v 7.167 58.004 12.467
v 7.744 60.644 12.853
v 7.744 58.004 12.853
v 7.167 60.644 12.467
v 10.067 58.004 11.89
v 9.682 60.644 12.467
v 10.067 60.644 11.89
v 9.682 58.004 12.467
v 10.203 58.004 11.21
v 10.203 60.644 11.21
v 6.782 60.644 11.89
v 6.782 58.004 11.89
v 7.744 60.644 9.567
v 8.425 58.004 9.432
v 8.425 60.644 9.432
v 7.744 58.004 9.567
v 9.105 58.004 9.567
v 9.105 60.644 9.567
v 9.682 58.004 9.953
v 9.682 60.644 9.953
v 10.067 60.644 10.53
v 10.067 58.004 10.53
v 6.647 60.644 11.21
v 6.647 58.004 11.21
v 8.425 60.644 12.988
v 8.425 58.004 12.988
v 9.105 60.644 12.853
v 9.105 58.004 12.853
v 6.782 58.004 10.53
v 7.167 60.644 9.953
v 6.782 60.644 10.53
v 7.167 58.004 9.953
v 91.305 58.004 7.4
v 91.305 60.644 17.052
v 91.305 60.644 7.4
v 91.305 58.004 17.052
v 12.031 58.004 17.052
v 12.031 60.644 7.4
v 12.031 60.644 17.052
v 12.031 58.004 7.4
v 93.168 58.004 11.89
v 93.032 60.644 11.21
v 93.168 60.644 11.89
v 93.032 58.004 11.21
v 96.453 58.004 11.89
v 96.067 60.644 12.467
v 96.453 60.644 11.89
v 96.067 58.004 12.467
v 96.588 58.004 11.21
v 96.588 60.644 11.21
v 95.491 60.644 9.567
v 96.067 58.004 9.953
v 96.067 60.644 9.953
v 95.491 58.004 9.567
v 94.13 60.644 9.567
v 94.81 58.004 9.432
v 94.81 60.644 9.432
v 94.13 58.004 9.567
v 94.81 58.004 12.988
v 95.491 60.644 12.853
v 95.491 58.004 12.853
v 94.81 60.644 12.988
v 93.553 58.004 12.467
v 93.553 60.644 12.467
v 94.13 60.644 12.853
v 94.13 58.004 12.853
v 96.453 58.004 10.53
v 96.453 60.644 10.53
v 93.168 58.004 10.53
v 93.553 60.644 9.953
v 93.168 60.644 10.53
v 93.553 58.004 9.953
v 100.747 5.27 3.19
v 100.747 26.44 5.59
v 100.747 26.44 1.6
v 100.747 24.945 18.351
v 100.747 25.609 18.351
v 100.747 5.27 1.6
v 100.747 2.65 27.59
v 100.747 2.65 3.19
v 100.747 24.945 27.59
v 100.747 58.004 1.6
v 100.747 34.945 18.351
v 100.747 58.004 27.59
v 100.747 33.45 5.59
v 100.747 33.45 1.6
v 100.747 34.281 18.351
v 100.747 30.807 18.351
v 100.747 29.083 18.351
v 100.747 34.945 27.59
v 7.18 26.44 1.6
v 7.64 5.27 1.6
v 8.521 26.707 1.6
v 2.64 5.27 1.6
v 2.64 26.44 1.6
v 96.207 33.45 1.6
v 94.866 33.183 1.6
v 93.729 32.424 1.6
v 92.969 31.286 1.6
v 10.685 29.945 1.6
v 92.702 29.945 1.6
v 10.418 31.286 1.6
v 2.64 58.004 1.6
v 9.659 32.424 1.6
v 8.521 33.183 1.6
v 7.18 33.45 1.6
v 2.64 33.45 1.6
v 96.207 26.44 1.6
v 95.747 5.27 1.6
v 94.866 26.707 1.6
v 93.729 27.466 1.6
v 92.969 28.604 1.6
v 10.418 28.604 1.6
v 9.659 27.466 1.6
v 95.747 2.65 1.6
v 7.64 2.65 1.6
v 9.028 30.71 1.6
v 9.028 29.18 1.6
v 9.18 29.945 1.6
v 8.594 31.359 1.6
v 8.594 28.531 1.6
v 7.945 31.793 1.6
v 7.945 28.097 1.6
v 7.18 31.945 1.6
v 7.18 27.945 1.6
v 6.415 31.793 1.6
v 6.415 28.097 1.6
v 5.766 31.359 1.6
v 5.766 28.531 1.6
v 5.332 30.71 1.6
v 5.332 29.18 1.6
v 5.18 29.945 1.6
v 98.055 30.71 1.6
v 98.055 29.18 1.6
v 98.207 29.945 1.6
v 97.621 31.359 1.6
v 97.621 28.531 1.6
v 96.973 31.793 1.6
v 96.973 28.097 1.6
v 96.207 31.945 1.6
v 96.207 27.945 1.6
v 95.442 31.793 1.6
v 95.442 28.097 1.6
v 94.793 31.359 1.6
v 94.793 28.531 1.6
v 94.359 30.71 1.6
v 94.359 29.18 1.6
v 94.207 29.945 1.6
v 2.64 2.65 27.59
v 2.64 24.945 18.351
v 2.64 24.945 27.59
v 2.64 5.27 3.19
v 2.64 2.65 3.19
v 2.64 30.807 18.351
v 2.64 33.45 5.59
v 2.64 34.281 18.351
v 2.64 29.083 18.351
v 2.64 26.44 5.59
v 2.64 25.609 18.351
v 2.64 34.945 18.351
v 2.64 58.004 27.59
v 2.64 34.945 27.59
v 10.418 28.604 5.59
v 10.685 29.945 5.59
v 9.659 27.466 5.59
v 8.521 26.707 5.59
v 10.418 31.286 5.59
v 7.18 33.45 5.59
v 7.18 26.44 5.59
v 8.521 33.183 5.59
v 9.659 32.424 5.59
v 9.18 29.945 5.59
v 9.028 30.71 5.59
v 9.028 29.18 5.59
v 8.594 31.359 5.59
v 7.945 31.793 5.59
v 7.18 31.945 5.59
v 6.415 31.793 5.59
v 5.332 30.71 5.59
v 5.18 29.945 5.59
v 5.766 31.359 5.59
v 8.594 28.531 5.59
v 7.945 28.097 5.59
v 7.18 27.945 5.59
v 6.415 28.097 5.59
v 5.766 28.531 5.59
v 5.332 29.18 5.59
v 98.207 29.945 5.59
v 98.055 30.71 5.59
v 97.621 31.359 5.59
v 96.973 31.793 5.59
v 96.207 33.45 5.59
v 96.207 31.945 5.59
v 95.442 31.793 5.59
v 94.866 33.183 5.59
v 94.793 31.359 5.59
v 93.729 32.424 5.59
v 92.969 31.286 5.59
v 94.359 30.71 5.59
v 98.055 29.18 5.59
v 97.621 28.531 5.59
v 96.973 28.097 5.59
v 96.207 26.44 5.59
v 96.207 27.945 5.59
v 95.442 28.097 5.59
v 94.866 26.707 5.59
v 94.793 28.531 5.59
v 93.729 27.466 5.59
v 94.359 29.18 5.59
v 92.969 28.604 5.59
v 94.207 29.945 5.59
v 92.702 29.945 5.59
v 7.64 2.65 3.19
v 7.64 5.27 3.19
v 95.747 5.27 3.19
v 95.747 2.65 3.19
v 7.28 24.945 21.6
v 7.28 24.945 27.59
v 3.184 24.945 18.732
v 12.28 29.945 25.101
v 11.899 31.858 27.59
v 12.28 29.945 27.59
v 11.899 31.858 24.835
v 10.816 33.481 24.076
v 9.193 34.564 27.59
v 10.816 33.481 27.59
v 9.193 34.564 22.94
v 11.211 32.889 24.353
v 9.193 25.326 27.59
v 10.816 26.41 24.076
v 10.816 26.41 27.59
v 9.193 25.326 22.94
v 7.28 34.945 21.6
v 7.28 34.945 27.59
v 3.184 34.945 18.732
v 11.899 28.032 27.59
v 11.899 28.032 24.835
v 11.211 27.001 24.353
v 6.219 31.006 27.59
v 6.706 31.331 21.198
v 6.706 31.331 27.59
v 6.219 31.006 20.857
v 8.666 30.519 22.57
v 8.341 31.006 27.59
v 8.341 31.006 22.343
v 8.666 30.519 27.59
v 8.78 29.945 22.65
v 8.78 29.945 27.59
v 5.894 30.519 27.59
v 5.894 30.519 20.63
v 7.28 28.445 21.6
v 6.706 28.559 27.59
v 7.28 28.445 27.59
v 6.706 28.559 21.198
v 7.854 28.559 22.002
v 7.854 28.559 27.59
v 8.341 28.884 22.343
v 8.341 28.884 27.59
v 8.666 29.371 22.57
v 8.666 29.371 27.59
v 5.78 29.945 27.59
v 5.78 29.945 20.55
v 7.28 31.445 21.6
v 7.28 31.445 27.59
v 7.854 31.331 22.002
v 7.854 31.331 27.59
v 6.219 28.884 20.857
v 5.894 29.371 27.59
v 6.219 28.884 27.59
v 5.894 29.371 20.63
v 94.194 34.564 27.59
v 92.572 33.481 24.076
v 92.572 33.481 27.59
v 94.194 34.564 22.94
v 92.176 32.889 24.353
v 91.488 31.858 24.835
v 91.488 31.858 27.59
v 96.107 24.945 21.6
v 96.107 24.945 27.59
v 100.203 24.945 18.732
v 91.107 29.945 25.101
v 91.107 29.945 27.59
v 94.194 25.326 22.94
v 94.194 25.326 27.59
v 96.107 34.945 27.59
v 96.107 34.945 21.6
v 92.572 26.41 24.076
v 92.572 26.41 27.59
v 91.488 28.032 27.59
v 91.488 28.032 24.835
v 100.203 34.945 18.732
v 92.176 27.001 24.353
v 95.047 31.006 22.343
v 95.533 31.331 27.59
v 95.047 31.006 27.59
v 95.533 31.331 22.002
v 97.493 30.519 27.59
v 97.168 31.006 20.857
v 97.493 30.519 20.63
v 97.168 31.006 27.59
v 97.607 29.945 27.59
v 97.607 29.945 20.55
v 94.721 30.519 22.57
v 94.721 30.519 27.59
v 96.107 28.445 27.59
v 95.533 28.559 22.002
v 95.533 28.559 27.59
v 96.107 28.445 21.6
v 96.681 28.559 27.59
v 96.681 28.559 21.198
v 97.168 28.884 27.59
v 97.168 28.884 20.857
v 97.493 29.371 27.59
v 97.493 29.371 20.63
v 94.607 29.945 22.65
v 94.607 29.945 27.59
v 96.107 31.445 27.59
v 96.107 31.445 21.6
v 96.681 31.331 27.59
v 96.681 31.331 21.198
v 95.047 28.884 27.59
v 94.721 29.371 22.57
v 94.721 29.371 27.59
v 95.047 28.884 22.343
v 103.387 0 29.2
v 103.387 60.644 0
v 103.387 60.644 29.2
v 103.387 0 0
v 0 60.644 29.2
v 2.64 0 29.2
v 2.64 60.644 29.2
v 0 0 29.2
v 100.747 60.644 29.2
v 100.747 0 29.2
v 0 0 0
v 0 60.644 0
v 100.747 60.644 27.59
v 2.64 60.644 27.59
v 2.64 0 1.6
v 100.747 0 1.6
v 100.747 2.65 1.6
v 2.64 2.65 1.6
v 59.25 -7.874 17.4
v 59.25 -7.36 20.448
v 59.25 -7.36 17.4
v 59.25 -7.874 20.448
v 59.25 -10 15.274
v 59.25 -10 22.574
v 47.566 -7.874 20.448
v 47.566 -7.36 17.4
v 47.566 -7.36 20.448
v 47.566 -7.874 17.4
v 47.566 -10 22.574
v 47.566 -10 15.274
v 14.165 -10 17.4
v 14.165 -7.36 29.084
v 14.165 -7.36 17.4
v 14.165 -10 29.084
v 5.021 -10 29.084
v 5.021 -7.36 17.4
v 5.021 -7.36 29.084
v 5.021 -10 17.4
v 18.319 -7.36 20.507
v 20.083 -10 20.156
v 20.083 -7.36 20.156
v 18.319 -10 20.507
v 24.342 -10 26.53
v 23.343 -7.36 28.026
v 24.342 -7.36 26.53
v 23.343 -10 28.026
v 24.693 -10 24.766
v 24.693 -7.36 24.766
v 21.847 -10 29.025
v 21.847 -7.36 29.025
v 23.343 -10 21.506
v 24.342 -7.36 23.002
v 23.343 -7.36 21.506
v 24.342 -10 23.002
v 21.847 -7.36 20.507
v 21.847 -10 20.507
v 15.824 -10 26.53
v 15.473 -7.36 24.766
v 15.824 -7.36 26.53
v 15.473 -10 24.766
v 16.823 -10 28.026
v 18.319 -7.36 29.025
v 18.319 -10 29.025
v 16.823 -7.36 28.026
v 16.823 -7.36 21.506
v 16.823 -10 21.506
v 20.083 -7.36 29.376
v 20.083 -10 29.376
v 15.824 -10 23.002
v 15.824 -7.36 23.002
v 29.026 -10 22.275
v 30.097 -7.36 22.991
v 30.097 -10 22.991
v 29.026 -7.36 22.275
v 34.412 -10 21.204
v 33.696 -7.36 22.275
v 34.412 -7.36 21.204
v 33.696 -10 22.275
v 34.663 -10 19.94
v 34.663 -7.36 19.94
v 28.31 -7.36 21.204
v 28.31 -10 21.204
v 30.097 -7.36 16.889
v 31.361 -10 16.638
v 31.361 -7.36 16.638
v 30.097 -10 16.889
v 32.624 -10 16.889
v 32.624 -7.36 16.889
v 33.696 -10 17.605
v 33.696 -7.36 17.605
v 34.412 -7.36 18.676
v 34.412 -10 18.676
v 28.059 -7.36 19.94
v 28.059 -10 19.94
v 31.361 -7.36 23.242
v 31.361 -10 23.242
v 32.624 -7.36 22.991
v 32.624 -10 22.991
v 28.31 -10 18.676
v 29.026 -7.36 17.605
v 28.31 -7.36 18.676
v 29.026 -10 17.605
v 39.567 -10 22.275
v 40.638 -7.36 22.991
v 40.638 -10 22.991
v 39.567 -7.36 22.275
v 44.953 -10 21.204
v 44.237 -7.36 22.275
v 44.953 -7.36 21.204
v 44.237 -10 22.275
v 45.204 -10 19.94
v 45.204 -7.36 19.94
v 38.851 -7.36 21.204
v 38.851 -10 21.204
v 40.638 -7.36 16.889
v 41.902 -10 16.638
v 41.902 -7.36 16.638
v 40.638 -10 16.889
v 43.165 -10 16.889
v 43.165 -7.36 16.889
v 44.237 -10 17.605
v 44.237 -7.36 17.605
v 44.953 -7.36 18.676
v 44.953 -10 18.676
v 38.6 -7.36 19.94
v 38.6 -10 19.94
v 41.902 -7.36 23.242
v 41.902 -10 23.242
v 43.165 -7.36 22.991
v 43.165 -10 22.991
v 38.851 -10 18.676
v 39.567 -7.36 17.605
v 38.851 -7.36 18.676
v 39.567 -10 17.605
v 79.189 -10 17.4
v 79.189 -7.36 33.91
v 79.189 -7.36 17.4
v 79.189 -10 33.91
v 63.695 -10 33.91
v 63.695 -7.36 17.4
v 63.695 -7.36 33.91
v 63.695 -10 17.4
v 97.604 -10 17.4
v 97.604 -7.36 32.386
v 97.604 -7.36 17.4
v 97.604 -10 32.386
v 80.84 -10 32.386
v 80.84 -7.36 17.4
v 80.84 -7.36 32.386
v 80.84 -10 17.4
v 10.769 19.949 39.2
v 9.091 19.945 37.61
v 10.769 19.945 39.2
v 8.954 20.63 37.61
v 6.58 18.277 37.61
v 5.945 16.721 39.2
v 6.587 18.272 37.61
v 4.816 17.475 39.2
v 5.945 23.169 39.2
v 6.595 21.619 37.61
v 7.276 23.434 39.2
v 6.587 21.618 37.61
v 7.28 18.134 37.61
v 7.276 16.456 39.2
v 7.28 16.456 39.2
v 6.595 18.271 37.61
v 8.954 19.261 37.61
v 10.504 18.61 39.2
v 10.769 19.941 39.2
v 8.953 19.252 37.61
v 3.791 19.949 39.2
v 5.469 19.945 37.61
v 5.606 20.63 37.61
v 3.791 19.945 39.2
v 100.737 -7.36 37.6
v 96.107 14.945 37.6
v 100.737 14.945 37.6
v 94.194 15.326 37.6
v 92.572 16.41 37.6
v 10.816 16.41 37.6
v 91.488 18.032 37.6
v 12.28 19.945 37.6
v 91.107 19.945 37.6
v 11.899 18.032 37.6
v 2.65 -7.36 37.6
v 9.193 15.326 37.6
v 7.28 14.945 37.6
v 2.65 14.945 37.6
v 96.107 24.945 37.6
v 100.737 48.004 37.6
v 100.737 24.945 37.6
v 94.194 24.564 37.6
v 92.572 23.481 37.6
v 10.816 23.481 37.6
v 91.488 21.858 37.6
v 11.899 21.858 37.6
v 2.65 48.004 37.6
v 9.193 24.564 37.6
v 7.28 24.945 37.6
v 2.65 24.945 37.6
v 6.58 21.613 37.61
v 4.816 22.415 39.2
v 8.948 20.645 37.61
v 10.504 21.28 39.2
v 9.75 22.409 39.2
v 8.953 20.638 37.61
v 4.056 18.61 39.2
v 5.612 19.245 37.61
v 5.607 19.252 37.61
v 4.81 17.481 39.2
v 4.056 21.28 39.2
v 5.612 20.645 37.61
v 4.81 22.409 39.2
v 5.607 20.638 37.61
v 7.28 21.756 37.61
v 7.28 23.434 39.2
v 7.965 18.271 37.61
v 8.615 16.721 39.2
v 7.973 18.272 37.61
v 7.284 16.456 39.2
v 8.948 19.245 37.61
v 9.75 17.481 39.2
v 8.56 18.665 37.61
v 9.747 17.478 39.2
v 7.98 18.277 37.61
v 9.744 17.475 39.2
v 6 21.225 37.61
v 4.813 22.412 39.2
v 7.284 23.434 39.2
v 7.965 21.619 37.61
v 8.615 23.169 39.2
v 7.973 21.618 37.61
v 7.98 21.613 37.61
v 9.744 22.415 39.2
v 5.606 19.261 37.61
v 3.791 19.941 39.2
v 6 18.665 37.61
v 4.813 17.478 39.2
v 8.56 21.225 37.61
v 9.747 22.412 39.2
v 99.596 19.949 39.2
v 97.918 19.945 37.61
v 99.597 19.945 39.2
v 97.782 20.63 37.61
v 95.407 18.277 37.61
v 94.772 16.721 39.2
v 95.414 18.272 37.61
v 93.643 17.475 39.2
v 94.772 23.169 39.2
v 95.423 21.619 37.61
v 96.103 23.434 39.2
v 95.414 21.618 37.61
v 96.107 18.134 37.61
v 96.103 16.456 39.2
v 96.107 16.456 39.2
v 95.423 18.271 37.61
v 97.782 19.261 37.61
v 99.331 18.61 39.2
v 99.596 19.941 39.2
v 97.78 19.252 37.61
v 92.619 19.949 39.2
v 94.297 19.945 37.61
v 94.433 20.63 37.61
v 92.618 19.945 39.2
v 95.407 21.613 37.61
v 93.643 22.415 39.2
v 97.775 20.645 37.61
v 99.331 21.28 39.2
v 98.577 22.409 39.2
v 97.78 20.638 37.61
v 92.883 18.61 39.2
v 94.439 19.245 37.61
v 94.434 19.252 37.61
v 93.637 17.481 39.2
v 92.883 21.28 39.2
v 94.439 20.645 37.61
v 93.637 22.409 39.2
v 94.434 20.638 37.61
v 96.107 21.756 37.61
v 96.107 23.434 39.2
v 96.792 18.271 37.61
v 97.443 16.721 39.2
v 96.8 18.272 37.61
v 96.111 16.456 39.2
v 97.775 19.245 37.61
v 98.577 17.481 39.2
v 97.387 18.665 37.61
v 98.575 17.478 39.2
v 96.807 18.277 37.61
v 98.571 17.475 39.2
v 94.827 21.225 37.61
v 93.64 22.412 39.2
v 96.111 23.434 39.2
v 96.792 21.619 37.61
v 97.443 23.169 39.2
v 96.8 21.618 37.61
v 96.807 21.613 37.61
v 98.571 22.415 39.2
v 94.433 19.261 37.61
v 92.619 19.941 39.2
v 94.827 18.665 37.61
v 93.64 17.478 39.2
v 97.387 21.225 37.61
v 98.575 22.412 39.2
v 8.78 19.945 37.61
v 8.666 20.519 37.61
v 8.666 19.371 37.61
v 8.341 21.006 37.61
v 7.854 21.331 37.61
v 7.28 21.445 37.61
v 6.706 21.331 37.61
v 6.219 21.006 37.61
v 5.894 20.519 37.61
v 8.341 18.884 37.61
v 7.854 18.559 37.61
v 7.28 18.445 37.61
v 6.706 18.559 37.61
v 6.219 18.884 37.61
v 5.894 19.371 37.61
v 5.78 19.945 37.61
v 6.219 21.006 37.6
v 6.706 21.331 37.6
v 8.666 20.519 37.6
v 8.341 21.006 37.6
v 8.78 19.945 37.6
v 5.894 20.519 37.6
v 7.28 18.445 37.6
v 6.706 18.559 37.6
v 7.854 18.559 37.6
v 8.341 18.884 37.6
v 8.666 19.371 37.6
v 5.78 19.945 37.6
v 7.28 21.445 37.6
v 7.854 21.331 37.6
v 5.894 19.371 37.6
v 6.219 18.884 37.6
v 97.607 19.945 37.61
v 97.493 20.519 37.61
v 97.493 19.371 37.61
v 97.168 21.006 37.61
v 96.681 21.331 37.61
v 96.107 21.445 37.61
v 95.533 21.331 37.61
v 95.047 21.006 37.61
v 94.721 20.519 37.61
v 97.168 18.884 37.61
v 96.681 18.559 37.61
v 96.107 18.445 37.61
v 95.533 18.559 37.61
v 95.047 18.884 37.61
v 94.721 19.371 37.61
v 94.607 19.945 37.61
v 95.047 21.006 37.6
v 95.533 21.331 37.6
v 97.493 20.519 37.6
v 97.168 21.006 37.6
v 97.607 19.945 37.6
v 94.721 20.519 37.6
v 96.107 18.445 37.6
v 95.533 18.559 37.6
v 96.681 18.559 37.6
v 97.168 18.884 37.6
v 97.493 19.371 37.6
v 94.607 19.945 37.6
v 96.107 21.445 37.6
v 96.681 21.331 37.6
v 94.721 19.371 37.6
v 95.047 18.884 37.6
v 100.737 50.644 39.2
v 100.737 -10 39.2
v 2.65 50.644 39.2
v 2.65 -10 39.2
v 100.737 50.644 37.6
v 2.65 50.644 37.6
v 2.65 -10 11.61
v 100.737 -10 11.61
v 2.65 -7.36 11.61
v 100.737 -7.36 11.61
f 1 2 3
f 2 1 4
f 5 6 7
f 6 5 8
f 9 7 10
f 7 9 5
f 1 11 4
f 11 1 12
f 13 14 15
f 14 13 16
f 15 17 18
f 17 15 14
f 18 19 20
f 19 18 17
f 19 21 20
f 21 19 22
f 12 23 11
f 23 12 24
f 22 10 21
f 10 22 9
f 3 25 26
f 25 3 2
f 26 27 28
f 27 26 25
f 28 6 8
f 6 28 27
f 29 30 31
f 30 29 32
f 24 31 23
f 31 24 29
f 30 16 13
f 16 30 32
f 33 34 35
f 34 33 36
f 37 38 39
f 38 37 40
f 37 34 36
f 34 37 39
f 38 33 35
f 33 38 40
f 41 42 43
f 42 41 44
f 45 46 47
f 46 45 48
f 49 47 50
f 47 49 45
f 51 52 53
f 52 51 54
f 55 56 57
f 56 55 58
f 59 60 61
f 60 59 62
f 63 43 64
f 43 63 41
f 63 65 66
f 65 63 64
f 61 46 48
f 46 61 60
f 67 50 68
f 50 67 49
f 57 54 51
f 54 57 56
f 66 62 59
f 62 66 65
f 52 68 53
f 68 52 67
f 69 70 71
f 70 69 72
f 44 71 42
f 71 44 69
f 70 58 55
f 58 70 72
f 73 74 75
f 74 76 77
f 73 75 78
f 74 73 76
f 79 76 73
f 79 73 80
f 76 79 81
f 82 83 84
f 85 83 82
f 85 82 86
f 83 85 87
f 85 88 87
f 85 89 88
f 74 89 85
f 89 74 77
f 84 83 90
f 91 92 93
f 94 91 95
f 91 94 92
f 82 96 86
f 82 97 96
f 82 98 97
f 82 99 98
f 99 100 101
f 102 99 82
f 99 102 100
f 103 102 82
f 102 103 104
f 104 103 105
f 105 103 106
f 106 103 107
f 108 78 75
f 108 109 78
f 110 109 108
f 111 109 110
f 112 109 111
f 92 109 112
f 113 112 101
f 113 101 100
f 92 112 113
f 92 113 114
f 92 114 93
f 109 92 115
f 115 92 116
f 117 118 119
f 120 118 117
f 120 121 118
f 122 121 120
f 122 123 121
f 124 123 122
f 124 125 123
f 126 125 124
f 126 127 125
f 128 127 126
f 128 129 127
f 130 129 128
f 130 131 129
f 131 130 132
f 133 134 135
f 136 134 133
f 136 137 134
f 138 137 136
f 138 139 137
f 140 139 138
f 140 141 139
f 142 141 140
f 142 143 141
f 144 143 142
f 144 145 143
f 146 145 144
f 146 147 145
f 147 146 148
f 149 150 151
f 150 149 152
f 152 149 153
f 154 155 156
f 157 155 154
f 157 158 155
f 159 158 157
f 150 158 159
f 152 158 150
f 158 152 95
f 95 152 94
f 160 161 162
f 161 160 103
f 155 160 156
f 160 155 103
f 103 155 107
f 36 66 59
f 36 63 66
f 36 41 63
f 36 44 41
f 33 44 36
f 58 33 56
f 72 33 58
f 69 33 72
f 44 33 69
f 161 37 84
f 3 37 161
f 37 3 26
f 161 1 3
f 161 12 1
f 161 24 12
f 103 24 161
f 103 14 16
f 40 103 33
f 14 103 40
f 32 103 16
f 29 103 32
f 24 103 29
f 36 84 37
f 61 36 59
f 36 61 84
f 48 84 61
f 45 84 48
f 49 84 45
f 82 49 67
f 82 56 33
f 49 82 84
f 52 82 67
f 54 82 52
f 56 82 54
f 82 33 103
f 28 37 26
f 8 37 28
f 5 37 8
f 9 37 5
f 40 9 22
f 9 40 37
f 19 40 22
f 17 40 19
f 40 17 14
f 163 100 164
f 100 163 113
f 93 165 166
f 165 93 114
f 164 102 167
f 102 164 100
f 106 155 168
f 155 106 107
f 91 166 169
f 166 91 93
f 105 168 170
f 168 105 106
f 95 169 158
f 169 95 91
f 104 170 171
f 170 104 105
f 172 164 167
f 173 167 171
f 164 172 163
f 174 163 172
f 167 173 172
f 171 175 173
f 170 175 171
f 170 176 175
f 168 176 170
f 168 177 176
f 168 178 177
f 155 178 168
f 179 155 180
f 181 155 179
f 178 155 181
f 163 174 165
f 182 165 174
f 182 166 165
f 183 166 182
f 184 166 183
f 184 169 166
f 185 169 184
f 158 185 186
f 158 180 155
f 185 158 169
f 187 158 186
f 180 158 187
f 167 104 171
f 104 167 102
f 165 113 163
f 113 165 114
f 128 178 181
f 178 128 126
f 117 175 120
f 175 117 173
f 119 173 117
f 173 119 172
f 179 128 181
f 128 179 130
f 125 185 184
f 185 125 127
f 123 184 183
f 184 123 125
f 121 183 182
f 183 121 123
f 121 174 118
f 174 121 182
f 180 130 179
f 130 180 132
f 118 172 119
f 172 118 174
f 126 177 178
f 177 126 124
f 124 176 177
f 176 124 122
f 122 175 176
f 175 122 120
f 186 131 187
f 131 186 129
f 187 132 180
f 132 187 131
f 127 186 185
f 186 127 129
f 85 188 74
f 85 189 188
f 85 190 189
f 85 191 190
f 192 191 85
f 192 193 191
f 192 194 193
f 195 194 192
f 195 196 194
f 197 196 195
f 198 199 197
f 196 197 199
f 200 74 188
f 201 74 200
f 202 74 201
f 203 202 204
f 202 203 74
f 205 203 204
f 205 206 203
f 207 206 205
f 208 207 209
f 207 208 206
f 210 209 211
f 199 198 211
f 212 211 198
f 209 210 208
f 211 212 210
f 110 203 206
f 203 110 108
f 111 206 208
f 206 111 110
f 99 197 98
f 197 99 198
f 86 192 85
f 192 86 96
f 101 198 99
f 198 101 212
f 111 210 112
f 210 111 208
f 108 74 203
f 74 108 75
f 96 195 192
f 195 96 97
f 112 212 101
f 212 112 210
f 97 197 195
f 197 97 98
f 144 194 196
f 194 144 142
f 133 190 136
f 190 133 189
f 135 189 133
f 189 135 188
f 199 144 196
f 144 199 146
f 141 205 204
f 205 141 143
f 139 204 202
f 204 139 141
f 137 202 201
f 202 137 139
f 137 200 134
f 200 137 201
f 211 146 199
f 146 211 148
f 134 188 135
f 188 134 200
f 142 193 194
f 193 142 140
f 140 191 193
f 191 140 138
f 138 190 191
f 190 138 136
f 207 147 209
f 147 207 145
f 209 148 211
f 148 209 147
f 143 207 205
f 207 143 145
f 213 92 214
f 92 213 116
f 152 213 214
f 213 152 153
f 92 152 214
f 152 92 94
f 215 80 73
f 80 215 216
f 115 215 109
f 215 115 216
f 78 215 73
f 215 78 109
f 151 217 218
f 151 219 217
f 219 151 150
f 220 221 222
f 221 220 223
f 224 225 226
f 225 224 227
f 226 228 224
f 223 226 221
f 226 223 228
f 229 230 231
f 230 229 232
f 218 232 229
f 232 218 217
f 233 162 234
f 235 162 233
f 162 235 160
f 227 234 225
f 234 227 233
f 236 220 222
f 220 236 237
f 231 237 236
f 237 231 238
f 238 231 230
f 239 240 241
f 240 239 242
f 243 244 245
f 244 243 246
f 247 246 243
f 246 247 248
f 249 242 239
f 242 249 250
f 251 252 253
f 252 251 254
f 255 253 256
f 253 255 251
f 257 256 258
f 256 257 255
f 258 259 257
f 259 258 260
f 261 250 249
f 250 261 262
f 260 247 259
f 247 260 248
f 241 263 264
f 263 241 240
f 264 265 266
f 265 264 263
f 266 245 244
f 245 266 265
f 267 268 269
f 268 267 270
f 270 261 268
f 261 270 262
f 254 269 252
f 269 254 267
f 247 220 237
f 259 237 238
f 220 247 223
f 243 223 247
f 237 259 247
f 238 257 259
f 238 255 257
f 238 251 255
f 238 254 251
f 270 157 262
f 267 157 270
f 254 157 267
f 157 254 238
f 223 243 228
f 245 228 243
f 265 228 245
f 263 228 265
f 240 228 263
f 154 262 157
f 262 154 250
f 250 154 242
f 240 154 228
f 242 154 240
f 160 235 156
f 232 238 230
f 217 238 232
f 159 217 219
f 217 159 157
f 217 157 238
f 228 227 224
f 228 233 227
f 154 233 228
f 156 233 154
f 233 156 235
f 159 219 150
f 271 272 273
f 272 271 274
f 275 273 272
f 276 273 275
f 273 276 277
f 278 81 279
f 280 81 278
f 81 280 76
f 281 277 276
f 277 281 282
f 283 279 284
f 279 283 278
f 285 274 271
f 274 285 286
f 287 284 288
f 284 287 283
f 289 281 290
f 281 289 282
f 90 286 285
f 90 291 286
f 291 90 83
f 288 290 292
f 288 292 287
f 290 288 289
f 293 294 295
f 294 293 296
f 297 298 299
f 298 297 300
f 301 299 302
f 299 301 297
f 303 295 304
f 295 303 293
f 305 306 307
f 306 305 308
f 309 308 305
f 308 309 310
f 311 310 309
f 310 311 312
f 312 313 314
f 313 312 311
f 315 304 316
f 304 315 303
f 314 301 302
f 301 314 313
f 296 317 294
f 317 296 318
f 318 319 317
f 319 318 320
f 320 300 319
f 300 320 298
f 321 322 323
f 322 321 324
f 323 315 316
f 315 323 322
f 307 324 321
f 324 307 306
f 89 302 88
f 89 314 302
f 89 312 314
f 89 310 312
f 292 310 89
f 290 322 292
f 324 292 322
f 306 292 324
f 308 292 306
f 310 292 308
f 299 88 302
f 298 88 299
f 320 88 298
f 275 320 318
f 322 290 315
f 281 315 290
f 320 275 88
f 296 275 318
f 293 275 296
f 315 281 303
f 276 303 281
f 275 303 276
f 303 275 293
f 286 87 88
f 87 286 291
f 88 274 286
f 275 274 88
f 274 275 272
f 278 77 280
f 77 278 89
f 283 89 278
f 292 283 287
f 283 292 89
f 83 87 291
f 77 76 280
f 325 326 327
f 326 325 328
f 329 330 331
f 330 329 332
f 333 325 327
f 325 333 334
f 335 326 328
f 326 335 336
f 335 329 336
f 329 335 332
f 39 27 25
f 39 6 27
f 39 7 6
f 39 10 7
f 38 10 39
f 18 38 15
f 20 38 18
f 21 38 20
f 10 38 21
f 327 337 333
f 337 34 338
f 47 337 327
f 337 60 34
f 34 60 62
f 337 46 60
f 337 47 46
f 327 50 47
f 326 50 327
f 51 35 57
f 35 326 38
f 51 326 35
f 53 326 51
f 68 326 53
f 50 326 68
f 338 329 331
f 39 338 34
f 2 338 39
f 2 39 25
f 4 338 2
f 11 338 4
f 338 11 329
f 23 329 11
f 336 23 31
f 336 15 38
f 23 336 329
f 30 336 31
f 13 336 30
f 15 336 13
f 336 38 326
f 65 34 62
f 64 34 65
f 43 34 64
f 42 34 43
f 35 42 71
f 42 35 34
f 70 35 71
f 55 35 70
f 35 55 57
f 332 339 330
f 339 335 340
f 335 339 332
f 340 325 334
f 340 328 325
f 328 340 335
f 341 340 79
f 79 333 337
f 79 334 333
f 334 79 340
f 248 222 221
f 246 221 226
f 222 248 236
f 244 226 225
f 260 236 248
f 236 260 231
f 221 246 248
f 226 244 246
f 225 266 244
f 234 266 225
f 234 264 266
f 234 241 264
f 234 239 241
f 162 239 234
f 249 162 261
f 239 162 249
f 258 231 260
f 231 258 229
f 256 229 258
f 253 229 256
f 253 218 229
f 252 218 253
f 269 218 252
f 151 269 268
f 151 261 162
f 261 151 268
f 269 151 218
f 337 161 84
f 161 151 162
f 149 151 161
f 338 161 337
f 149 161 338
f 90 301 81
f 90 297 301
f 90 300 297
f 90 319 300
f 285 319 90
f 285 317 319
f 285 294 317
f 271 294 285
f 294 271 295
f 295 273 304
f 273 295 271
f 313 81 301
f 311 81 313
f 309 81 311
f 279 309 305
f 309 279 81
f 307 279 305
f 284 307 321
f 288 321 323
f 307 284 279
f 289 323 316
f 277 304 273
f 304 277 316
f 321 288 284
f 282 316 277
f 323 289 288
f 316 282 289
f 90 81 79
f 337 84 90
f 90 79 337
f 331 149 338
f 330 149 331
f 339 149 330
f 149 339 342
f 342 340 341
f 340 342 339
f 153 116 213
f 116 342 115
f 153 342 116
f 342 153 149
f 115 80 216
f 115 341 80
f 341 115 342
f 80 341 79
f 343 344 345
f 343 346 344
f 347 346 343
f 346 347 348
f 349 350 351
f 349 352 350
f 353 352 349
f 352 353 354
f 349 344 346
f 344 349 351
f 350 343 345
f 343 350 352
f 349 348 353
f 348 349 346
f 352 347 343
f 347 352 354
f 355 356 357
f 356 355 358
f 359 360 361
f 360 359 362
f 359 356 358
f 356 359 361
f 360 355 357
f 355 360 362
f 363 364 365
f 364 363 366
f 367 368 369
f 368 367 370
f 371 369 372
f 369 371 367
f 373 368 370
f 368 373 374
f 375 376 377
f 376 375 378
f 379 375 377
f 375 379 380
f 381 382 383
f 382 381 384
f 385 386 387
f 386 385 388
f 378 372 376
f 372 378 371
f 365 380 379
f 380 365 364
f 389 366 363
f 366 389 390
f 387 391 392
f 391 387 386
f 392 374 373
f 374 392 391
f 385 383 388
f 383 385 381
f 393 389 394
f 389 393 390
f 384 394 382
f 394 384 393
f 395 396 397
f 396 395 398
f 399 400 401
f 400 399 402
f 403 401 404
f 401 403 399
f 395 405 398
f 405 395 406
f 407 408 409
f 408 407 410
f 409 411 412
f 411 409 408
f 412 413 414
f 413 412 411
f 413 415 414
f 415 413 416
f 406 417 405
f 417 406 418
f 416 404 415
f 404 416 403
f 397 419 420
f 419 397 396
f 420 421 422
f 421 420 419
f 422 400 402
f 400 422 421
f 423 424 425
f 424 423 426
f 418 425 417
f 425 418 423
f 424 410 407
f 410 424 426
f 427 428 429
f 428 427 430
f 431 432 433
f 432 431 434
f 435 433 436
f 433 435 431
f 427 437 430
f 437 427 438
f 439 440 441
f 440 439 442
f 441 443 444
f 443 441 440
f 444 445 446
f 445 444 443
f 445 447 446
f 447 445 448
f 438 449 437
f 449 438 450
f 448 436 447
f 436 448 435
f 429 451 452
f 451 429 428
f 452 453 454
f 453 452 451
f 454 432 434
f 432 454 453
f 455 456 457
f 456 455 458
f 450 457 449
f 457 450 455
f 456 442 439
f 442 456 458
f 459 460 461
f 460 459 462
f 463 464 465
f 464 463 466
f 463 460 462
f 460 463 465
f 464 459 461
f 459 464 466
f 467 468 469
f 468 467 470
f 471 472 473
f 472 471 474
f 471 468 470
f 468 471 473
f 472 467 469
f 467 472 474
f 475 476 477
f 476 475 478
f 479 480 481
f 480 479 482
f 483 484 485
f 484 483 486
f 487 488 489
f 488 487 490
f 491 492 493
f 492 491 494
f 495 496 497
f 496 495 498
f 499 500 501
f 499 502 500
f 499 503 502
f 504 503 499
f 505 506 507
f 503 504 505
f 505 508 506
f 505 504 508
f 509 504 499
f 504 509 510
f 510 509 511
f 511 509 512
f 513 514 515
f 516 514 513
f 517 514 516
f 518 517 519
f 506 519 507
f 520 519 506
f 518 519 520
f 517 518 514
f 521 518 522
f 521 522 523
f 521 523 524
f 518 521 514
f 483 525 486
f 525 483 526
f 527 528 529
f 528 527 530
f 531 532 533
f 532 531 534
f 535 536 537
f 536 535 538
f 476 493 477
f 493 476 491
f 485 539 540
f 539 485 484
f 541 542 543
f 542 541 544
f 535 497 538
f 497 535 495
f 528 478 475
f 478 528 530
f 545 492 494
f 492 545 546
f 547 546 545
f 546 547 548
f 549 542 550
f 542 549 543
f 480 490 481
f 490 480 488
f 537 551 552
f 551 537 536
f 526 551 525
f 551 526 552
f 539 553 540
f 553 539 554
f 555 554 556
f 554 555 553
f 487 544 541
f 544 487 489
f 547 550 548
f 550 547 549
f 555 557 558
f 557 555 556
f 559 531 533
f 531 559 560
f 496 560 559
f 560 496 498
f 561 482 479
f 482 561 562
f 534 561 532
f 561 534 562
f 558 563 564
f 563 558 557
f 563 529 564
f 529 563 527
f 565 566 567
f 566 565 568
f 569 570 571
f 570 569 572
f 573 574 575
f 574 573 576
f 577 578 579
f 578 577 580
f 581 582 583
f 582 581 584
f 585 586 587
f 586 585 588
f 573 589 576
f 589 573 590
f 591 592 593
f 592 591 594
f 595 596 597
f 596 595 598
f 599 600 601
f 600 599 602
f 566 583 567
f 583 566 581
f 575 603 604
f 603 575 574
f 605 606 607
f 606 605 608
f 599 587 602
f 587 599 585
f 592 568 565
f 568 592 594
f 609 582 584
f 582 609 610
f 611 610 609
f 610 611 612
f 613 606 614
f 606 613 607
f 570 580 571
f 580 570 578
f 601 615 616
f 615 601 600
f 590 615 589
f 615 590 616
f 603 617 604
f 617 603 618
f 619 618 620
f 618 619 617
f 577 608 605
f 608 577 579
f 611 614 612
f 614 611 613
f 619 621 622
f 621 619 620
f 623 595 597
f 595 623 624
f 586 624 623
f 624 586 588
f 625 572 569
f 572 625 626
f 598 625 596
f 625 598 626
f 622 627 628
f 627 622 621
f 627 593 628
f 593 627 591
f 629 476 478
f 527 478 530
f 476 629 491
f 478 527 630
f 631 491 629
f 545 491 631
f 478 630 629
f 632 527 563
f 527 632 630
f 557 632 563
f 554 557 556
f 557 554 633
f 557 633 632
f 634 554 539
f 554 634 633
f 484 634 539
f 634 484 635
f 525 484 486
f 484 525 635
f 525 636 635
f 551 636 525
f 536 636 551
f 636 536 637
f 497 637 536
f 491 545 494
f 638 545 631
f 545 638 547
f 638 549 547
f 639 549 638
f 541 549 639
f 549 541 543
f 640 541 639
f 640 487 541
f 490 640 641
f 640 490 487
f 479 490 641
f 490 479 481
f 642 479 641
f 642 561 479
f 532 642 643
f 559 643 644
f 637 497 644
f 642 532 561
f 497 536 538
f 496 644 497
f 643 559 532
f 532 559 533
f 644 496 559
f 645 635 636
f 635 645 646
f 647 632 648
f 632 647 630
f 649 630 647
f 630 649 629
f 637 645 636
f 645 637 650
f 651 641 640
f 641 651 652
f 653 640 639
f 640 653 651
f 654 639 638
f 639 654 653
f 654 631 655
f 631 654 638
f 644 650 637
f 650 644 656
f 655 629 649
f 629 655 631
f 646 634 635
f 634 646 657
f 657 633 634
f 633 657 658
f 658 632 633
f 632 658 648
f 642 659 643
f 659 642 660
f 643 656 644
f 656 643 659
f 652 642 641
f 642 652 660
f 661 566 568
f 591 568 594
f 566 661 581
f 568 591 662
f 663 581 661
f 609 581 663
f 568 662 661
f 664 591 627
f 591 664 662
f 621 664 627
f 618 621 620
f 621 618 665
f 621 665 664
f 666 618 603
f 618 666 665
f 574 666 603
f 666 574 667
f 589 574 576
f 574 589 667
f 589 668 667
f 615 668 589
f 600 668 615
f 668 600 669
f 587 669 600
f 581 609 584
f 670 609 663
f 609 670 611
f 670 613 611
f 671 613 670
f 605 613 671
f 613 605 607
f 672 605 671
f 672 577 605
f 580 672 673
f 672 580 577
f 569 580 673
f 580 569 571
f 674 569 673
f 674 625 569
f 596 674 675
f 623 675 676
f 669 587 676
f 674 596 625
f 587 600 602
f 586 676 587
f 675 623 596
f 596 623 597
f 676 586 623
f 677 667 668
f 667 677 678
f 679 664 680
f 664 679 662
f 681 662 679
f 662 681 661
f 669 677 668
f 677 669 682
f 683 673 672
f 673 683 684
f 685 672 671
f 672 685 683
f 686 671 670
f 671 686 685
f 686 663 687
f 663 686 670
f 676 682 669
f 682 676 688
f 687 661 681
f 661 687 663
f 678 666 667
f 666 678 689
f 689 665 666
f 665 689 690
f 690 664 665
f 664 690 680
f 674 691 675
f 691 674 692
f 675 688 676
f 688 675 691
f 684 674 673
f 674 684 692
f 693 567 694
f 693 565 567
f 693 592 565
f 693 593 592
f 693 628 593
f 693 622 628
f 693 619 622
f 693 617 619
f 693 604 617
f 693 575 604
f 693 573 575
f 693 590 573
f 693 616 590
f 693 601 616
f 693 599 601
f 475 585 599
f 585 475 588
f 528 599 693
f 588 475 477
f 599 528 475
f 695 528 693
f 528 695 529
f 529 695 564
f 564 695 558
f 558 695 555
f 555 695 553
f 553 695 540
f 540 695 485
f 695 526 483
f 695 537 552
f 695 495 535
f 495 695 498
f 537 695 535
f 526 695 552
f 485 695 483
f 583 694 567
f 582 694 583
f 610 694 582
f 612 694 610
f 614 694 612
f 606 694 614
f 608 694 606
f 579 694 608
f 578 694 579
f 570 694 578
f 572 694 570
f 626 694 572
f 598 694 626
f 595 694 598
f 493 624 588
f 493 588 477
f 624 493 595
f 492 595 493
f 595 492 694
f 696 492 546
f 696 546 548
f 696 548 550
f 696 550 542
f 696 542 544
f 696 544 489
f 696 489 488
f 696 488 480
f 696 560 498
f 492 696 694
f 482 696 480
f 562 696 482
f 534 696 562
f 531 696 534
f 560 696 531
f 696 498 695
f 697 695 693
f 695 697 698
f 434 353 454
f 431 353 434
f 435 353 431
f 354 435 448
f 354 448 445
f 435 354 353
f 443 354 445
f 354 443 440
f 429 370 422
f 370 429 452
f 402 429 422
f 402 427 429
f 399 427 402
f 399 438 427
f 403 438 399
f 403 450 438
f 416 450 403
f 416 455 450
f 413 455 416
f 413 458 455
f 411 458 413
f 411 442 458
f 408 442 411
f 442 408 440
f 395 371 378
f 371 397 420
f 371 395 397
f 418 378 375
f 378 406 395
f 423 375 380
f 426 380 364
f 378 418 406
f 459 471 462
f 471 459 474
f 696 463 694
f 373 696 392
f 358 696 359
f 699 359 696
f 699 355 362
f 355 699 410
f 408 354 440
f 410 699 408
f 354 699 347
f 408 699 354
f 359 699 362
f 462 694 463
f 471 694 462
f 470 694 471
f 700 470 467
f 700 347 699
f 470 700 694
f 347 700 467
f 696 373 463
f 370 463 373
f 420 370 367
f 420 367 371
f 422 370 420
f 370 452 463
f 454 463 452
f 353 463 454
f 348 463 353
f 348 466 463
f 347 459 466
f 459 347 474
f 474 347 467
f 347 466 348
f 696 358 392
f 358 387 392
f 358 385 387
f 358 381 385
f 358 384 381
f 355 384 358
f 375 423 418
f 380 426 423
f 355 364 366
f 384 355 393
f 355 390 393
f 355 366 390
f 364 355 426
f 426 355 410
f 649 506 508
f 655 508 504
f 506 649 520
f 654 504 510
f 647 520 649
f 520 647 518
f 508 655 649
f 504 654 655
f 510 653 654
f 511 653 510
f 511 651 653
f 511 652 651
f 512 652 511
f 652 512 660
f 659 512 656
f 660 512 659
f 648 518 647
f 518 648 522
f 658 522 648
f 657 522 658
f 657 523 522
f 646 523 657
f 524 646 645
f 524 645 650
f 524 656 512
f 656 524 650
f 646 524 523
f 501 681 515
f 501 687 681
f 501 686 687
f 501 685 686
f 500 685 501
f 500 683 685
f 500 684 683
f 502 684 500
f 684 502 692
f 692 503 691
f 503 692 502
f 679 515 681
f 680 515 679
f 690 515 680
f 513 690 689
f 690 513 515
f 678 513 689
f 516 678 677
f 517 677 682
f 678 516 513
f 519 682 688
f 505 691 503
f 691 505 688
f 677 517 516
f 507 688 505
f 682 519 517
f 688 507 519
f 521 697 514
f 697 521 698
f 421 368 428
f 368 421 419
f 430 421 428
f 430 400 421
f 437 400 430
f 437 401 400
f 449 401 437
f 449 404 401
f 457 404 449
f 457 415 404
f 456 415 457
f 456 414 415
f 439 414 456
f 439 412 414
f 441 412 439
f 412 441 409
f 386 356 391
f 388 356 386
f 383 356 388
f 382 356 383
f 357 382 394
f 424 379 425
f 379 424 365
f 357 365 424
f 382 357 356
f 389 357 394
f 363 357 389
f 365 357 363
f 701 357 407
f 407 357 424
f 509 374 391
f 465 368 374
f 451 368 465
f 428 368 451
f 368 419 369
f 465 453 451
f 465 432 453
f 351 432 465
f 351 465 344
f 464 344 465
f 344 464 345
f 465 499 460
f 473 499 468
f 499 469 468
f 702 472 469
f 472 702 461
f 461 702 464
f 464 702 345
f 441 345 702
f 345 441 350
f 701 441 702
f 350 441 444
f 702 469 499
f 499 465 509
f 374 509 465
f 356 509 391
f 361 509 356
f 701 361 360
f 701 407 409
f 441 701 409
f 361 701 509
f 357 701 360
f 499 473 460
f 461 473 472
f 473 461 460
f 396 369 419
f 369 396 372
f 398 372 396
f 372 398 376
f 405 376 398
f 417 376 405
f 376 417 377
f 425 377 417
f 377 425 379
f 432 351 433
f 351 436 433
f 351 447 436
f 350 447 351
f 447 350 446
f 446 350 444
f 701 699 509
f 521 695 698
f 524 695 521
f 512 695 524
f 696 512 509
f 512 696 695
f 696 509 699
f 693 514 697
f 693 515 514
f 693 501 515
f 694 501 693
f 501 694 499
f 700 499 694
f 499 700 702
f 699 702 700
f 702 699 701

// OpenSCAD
/*
 * Most of the measurements are in mil, straight off the eagle board file
 *
 * (C) Michel Pollet <buserror@gmail.com>
 *
 ************************LICENSING TERMS***************************
 * This part is not for commercial distribution without a commercial 
 * license acquired from the author. Distribution on a small scale 
 * basis (< 25 units) in the Reprap spirit is free of charge on the
 * basis of mentioning the Author with the bill of material, any 
 * wider distribution requires my explicit, written permission.
 ******************************************************************
 *
 */
$fn = 16;

E=0.01;
mm = 1 / 39.37;

pushbutton_margin = 0.5;	

pcb_size = [ 3705 * mm, 2160 * mm, 20 ];
pcb_thickness = 1.8;

mounting_pos = [100 * mm, 1075 * mm, 0];
mounting_hole_r = 40 * mm;
mounting_tab_r = 138 * mm;
mounting_hole_r = 2;

thickness_side = 6 * 0.44;
thickness_plane = 8 * 0.20;

margin_b = 4;	// for screw inserts
margin_t = 2;
margin_side = 2;

screwtop_pos = [thickness_side, mounting_pos[1], 0];
screwtop_outside_r = 5;
screwtop_outside_h = 10;
screwtop_drill_r = 1.5;
screwtop_screw_head_r = 3.5;

box_inside = [
	pcb_size[0] + (2 * margin_side), 
	pcb_size[1] + pushbutton_margin, 
	pcb_size[2] + margin_b + margin_t ];
box_outside = [
	box_inside[0] + (thickness_side * 2),
	box_inside[1] + (thickness_side * 2),
	box_inside[2] + (thickness_plane * 2)];

demo = 1;

if (demo == 1) {
	bottom();
	translate([0, -10, 10])
		top();
} else {
	translate([0, -box_outside[1]-1, 0])
		bottom();
	translate([box_outside[0],3,box_outside[2]])
		rotate([180,0,180])
			top();
}

//translate([0, -80, 0])
//%	inside();

module top() {
	difference() {
		whole();
		translate([-1, thickness_side, -thickness_plane])
			cube([box_outside[0] + 2, box_outside[1] + 1, box_outside[2]]);
		translate([-1, -1, -1])
			cube([1 + thickness_side + E, box_outside[1] + 2, box_outside[2] + 2]);
		translate([box_outside[0]-thickness_side-E, -1, -1])
			cube([1 + thickness_side + E, box_outside[1] + 2, box_outside[2] + 2]);
		translate([-1, -1, -1])
			cube([box_outside[0] + 2, thickness_side + 2, 1 + thickness_plane + E ]);
	}
}

module bottom() {
	difference() {
		whole();
		translate([thickness_side, -1, box_outside[2] - thickness_plane - E])
			cube([box_inside[0], box_outside[1] + 2, thickness_plane + 1]);
		translate([thickness_side, -1, thickness_plane])
			cube([box_inside[0], thickness_side + 1 + E,  box_outside[2]]);
	}
}


module whole() {
	union() {
		difference() {
			cube(box_outside);
			
			translate([thickness_side, thickness_side, thickness_plane])
				inside();
		}
	}
}

module inside() {
	difference() {
		union() {
			cube(box_inside);
			translate([margin_side, 0, margin_b + pcb_thickness])
			rotate([90, 0, 0])
				frontcuts();
			translate([margin_side, box_inside[1], margin_b + pcb_thickness])
			rotate([90, 0, 0])
				backcuts();

			// screw tapers at the top
			for (offset = [0:1]) assign(x_offset = margin_side + screwtop_pos[0])
			translate([(offset * (box_inside[0] - (2*x_offset))) + x_offset, 
					screwtop_pos[1], box_inside[2] - screwtop_outside_h]) {
				cylinder(r = screwtop_drill_r, 
					h = screwtop_outside_h + thickness_plane + E);

				translate([0, 0, screwtop_outside_h])
					cylinder(r1 = screwtop_drill_r * 1.2, 
							r2 = screwtop_screw_head_r,
							h = thickness_plane + E);
			}
		}
		// mounting holes
		translate([0,0,-E]) {
			for (offset = [0:1]) assign(x_offset = margin_side + mounting_pos[0])
			translate([(offset * (box_inside[0] - (2*x_offset))) + x_offset, 
					mounting_pos[1], mounting_pos[2]]) {
				difference() {
					hull() {
						cylinder(r = mounting_tab_r, h = margin_b);
						translate([(offset ? 1 : -1) * mounting_tab_r * 2, 0, 0])
						cylinder(r = mounting_tab_r, h = margin_b);
					}
					cylinder(r = mounting_hole_r, h = margin_b + E);
				}
			}
		}
		// small tabs at the bottom to keep it neat
		translate([0,-E,-E]) {
			cube([5, thickness_side, thickness_plane]);
			translate([box_inside[0]-5,0,0])
				cube([5, thickness_side, thickness_plane]);
		}
		for (offset = [0:1]) assign(x_offset = margin_side + screwtop_pos[0])
		translate([(offset * (box_inside[0] - (2*x_offset))) + x_offset, 
				screwtop_pos[1], box_inside[2] - screwtop_outside_h]) {
			difference() {
				hull() {
					cylinder(r = screwtop_outside_r, h = screwtop_outside_h + E);
					translate([(offset ? 1 : -1) * screwtop_outside_r * 2, 0, 0])
					cylinder(r = screwtop_outside_r, h = screwtop_outside_h + E);
				}
				cylinder(r = screwtop_drill_r, 
					h = screwtop_outside_h + thickness_plane + E);

				translate([0, 0, 4])
					rotate([0,(offset ? -1 : 1) * 145,0])
						cylinder(r = 10, h = 10);
			}
		}

	}
}

module frontcuts() {
	assign(h = thickness_side + 2*E)
	translate([0,0, -E]) {
		translate([(195 - (360/2)) * mm, 0, 0])
			cube([360 * mm, 460 * mm, h]);
		translate([608 * mm, 290 * mm, 0])	// composite
			cylinder(r = 1.1 * 165 * mm, h = h);
		translate([1052 * mm, 100 * mm, 0])	// audio jack
			cylinder(r = 1.3 * 100 * mm, h = h);
		translate([1467 * mm, 100 * mm, 0])	// audio jack
			cylinder(r = 1.3 * 100 * mm, h = h);
		translate([(1920 - (460/2)) * mm, 0, 0])	{ // sd card slot 
			cube([460 * mm, 120 * mm, h]);
			translate([0, (120/2) * mm, -1])
				rotate([45,0,0])
					cube([460 * mm, 6, 6]);
		}
		translate([(2630 - (610/2)) * mm, 0, 0])
			cube([610 * mm, 650 * mm, h]);
		translate([(3330 - (660/2)) * mm, 0, 0])
			cube([660 * mm, 590 * mm, h]);
	}
}

module backcuts() {
	assign(h = thickness_side + 2)
	translate([0,0, -thickness_side-E]) {
		translate([149 * mm, 150 * mm, 0])
			cylinder(r = 70 * mm, h = h);

		translate([291 * mm, 0, 0])
			cube([(3412 - 291) * mm, 380 * mm, h]);

		translate([3550 * mm, 150 * mm, 0])
			cylinder(r = 70 * mm, h = h);
	}
}
